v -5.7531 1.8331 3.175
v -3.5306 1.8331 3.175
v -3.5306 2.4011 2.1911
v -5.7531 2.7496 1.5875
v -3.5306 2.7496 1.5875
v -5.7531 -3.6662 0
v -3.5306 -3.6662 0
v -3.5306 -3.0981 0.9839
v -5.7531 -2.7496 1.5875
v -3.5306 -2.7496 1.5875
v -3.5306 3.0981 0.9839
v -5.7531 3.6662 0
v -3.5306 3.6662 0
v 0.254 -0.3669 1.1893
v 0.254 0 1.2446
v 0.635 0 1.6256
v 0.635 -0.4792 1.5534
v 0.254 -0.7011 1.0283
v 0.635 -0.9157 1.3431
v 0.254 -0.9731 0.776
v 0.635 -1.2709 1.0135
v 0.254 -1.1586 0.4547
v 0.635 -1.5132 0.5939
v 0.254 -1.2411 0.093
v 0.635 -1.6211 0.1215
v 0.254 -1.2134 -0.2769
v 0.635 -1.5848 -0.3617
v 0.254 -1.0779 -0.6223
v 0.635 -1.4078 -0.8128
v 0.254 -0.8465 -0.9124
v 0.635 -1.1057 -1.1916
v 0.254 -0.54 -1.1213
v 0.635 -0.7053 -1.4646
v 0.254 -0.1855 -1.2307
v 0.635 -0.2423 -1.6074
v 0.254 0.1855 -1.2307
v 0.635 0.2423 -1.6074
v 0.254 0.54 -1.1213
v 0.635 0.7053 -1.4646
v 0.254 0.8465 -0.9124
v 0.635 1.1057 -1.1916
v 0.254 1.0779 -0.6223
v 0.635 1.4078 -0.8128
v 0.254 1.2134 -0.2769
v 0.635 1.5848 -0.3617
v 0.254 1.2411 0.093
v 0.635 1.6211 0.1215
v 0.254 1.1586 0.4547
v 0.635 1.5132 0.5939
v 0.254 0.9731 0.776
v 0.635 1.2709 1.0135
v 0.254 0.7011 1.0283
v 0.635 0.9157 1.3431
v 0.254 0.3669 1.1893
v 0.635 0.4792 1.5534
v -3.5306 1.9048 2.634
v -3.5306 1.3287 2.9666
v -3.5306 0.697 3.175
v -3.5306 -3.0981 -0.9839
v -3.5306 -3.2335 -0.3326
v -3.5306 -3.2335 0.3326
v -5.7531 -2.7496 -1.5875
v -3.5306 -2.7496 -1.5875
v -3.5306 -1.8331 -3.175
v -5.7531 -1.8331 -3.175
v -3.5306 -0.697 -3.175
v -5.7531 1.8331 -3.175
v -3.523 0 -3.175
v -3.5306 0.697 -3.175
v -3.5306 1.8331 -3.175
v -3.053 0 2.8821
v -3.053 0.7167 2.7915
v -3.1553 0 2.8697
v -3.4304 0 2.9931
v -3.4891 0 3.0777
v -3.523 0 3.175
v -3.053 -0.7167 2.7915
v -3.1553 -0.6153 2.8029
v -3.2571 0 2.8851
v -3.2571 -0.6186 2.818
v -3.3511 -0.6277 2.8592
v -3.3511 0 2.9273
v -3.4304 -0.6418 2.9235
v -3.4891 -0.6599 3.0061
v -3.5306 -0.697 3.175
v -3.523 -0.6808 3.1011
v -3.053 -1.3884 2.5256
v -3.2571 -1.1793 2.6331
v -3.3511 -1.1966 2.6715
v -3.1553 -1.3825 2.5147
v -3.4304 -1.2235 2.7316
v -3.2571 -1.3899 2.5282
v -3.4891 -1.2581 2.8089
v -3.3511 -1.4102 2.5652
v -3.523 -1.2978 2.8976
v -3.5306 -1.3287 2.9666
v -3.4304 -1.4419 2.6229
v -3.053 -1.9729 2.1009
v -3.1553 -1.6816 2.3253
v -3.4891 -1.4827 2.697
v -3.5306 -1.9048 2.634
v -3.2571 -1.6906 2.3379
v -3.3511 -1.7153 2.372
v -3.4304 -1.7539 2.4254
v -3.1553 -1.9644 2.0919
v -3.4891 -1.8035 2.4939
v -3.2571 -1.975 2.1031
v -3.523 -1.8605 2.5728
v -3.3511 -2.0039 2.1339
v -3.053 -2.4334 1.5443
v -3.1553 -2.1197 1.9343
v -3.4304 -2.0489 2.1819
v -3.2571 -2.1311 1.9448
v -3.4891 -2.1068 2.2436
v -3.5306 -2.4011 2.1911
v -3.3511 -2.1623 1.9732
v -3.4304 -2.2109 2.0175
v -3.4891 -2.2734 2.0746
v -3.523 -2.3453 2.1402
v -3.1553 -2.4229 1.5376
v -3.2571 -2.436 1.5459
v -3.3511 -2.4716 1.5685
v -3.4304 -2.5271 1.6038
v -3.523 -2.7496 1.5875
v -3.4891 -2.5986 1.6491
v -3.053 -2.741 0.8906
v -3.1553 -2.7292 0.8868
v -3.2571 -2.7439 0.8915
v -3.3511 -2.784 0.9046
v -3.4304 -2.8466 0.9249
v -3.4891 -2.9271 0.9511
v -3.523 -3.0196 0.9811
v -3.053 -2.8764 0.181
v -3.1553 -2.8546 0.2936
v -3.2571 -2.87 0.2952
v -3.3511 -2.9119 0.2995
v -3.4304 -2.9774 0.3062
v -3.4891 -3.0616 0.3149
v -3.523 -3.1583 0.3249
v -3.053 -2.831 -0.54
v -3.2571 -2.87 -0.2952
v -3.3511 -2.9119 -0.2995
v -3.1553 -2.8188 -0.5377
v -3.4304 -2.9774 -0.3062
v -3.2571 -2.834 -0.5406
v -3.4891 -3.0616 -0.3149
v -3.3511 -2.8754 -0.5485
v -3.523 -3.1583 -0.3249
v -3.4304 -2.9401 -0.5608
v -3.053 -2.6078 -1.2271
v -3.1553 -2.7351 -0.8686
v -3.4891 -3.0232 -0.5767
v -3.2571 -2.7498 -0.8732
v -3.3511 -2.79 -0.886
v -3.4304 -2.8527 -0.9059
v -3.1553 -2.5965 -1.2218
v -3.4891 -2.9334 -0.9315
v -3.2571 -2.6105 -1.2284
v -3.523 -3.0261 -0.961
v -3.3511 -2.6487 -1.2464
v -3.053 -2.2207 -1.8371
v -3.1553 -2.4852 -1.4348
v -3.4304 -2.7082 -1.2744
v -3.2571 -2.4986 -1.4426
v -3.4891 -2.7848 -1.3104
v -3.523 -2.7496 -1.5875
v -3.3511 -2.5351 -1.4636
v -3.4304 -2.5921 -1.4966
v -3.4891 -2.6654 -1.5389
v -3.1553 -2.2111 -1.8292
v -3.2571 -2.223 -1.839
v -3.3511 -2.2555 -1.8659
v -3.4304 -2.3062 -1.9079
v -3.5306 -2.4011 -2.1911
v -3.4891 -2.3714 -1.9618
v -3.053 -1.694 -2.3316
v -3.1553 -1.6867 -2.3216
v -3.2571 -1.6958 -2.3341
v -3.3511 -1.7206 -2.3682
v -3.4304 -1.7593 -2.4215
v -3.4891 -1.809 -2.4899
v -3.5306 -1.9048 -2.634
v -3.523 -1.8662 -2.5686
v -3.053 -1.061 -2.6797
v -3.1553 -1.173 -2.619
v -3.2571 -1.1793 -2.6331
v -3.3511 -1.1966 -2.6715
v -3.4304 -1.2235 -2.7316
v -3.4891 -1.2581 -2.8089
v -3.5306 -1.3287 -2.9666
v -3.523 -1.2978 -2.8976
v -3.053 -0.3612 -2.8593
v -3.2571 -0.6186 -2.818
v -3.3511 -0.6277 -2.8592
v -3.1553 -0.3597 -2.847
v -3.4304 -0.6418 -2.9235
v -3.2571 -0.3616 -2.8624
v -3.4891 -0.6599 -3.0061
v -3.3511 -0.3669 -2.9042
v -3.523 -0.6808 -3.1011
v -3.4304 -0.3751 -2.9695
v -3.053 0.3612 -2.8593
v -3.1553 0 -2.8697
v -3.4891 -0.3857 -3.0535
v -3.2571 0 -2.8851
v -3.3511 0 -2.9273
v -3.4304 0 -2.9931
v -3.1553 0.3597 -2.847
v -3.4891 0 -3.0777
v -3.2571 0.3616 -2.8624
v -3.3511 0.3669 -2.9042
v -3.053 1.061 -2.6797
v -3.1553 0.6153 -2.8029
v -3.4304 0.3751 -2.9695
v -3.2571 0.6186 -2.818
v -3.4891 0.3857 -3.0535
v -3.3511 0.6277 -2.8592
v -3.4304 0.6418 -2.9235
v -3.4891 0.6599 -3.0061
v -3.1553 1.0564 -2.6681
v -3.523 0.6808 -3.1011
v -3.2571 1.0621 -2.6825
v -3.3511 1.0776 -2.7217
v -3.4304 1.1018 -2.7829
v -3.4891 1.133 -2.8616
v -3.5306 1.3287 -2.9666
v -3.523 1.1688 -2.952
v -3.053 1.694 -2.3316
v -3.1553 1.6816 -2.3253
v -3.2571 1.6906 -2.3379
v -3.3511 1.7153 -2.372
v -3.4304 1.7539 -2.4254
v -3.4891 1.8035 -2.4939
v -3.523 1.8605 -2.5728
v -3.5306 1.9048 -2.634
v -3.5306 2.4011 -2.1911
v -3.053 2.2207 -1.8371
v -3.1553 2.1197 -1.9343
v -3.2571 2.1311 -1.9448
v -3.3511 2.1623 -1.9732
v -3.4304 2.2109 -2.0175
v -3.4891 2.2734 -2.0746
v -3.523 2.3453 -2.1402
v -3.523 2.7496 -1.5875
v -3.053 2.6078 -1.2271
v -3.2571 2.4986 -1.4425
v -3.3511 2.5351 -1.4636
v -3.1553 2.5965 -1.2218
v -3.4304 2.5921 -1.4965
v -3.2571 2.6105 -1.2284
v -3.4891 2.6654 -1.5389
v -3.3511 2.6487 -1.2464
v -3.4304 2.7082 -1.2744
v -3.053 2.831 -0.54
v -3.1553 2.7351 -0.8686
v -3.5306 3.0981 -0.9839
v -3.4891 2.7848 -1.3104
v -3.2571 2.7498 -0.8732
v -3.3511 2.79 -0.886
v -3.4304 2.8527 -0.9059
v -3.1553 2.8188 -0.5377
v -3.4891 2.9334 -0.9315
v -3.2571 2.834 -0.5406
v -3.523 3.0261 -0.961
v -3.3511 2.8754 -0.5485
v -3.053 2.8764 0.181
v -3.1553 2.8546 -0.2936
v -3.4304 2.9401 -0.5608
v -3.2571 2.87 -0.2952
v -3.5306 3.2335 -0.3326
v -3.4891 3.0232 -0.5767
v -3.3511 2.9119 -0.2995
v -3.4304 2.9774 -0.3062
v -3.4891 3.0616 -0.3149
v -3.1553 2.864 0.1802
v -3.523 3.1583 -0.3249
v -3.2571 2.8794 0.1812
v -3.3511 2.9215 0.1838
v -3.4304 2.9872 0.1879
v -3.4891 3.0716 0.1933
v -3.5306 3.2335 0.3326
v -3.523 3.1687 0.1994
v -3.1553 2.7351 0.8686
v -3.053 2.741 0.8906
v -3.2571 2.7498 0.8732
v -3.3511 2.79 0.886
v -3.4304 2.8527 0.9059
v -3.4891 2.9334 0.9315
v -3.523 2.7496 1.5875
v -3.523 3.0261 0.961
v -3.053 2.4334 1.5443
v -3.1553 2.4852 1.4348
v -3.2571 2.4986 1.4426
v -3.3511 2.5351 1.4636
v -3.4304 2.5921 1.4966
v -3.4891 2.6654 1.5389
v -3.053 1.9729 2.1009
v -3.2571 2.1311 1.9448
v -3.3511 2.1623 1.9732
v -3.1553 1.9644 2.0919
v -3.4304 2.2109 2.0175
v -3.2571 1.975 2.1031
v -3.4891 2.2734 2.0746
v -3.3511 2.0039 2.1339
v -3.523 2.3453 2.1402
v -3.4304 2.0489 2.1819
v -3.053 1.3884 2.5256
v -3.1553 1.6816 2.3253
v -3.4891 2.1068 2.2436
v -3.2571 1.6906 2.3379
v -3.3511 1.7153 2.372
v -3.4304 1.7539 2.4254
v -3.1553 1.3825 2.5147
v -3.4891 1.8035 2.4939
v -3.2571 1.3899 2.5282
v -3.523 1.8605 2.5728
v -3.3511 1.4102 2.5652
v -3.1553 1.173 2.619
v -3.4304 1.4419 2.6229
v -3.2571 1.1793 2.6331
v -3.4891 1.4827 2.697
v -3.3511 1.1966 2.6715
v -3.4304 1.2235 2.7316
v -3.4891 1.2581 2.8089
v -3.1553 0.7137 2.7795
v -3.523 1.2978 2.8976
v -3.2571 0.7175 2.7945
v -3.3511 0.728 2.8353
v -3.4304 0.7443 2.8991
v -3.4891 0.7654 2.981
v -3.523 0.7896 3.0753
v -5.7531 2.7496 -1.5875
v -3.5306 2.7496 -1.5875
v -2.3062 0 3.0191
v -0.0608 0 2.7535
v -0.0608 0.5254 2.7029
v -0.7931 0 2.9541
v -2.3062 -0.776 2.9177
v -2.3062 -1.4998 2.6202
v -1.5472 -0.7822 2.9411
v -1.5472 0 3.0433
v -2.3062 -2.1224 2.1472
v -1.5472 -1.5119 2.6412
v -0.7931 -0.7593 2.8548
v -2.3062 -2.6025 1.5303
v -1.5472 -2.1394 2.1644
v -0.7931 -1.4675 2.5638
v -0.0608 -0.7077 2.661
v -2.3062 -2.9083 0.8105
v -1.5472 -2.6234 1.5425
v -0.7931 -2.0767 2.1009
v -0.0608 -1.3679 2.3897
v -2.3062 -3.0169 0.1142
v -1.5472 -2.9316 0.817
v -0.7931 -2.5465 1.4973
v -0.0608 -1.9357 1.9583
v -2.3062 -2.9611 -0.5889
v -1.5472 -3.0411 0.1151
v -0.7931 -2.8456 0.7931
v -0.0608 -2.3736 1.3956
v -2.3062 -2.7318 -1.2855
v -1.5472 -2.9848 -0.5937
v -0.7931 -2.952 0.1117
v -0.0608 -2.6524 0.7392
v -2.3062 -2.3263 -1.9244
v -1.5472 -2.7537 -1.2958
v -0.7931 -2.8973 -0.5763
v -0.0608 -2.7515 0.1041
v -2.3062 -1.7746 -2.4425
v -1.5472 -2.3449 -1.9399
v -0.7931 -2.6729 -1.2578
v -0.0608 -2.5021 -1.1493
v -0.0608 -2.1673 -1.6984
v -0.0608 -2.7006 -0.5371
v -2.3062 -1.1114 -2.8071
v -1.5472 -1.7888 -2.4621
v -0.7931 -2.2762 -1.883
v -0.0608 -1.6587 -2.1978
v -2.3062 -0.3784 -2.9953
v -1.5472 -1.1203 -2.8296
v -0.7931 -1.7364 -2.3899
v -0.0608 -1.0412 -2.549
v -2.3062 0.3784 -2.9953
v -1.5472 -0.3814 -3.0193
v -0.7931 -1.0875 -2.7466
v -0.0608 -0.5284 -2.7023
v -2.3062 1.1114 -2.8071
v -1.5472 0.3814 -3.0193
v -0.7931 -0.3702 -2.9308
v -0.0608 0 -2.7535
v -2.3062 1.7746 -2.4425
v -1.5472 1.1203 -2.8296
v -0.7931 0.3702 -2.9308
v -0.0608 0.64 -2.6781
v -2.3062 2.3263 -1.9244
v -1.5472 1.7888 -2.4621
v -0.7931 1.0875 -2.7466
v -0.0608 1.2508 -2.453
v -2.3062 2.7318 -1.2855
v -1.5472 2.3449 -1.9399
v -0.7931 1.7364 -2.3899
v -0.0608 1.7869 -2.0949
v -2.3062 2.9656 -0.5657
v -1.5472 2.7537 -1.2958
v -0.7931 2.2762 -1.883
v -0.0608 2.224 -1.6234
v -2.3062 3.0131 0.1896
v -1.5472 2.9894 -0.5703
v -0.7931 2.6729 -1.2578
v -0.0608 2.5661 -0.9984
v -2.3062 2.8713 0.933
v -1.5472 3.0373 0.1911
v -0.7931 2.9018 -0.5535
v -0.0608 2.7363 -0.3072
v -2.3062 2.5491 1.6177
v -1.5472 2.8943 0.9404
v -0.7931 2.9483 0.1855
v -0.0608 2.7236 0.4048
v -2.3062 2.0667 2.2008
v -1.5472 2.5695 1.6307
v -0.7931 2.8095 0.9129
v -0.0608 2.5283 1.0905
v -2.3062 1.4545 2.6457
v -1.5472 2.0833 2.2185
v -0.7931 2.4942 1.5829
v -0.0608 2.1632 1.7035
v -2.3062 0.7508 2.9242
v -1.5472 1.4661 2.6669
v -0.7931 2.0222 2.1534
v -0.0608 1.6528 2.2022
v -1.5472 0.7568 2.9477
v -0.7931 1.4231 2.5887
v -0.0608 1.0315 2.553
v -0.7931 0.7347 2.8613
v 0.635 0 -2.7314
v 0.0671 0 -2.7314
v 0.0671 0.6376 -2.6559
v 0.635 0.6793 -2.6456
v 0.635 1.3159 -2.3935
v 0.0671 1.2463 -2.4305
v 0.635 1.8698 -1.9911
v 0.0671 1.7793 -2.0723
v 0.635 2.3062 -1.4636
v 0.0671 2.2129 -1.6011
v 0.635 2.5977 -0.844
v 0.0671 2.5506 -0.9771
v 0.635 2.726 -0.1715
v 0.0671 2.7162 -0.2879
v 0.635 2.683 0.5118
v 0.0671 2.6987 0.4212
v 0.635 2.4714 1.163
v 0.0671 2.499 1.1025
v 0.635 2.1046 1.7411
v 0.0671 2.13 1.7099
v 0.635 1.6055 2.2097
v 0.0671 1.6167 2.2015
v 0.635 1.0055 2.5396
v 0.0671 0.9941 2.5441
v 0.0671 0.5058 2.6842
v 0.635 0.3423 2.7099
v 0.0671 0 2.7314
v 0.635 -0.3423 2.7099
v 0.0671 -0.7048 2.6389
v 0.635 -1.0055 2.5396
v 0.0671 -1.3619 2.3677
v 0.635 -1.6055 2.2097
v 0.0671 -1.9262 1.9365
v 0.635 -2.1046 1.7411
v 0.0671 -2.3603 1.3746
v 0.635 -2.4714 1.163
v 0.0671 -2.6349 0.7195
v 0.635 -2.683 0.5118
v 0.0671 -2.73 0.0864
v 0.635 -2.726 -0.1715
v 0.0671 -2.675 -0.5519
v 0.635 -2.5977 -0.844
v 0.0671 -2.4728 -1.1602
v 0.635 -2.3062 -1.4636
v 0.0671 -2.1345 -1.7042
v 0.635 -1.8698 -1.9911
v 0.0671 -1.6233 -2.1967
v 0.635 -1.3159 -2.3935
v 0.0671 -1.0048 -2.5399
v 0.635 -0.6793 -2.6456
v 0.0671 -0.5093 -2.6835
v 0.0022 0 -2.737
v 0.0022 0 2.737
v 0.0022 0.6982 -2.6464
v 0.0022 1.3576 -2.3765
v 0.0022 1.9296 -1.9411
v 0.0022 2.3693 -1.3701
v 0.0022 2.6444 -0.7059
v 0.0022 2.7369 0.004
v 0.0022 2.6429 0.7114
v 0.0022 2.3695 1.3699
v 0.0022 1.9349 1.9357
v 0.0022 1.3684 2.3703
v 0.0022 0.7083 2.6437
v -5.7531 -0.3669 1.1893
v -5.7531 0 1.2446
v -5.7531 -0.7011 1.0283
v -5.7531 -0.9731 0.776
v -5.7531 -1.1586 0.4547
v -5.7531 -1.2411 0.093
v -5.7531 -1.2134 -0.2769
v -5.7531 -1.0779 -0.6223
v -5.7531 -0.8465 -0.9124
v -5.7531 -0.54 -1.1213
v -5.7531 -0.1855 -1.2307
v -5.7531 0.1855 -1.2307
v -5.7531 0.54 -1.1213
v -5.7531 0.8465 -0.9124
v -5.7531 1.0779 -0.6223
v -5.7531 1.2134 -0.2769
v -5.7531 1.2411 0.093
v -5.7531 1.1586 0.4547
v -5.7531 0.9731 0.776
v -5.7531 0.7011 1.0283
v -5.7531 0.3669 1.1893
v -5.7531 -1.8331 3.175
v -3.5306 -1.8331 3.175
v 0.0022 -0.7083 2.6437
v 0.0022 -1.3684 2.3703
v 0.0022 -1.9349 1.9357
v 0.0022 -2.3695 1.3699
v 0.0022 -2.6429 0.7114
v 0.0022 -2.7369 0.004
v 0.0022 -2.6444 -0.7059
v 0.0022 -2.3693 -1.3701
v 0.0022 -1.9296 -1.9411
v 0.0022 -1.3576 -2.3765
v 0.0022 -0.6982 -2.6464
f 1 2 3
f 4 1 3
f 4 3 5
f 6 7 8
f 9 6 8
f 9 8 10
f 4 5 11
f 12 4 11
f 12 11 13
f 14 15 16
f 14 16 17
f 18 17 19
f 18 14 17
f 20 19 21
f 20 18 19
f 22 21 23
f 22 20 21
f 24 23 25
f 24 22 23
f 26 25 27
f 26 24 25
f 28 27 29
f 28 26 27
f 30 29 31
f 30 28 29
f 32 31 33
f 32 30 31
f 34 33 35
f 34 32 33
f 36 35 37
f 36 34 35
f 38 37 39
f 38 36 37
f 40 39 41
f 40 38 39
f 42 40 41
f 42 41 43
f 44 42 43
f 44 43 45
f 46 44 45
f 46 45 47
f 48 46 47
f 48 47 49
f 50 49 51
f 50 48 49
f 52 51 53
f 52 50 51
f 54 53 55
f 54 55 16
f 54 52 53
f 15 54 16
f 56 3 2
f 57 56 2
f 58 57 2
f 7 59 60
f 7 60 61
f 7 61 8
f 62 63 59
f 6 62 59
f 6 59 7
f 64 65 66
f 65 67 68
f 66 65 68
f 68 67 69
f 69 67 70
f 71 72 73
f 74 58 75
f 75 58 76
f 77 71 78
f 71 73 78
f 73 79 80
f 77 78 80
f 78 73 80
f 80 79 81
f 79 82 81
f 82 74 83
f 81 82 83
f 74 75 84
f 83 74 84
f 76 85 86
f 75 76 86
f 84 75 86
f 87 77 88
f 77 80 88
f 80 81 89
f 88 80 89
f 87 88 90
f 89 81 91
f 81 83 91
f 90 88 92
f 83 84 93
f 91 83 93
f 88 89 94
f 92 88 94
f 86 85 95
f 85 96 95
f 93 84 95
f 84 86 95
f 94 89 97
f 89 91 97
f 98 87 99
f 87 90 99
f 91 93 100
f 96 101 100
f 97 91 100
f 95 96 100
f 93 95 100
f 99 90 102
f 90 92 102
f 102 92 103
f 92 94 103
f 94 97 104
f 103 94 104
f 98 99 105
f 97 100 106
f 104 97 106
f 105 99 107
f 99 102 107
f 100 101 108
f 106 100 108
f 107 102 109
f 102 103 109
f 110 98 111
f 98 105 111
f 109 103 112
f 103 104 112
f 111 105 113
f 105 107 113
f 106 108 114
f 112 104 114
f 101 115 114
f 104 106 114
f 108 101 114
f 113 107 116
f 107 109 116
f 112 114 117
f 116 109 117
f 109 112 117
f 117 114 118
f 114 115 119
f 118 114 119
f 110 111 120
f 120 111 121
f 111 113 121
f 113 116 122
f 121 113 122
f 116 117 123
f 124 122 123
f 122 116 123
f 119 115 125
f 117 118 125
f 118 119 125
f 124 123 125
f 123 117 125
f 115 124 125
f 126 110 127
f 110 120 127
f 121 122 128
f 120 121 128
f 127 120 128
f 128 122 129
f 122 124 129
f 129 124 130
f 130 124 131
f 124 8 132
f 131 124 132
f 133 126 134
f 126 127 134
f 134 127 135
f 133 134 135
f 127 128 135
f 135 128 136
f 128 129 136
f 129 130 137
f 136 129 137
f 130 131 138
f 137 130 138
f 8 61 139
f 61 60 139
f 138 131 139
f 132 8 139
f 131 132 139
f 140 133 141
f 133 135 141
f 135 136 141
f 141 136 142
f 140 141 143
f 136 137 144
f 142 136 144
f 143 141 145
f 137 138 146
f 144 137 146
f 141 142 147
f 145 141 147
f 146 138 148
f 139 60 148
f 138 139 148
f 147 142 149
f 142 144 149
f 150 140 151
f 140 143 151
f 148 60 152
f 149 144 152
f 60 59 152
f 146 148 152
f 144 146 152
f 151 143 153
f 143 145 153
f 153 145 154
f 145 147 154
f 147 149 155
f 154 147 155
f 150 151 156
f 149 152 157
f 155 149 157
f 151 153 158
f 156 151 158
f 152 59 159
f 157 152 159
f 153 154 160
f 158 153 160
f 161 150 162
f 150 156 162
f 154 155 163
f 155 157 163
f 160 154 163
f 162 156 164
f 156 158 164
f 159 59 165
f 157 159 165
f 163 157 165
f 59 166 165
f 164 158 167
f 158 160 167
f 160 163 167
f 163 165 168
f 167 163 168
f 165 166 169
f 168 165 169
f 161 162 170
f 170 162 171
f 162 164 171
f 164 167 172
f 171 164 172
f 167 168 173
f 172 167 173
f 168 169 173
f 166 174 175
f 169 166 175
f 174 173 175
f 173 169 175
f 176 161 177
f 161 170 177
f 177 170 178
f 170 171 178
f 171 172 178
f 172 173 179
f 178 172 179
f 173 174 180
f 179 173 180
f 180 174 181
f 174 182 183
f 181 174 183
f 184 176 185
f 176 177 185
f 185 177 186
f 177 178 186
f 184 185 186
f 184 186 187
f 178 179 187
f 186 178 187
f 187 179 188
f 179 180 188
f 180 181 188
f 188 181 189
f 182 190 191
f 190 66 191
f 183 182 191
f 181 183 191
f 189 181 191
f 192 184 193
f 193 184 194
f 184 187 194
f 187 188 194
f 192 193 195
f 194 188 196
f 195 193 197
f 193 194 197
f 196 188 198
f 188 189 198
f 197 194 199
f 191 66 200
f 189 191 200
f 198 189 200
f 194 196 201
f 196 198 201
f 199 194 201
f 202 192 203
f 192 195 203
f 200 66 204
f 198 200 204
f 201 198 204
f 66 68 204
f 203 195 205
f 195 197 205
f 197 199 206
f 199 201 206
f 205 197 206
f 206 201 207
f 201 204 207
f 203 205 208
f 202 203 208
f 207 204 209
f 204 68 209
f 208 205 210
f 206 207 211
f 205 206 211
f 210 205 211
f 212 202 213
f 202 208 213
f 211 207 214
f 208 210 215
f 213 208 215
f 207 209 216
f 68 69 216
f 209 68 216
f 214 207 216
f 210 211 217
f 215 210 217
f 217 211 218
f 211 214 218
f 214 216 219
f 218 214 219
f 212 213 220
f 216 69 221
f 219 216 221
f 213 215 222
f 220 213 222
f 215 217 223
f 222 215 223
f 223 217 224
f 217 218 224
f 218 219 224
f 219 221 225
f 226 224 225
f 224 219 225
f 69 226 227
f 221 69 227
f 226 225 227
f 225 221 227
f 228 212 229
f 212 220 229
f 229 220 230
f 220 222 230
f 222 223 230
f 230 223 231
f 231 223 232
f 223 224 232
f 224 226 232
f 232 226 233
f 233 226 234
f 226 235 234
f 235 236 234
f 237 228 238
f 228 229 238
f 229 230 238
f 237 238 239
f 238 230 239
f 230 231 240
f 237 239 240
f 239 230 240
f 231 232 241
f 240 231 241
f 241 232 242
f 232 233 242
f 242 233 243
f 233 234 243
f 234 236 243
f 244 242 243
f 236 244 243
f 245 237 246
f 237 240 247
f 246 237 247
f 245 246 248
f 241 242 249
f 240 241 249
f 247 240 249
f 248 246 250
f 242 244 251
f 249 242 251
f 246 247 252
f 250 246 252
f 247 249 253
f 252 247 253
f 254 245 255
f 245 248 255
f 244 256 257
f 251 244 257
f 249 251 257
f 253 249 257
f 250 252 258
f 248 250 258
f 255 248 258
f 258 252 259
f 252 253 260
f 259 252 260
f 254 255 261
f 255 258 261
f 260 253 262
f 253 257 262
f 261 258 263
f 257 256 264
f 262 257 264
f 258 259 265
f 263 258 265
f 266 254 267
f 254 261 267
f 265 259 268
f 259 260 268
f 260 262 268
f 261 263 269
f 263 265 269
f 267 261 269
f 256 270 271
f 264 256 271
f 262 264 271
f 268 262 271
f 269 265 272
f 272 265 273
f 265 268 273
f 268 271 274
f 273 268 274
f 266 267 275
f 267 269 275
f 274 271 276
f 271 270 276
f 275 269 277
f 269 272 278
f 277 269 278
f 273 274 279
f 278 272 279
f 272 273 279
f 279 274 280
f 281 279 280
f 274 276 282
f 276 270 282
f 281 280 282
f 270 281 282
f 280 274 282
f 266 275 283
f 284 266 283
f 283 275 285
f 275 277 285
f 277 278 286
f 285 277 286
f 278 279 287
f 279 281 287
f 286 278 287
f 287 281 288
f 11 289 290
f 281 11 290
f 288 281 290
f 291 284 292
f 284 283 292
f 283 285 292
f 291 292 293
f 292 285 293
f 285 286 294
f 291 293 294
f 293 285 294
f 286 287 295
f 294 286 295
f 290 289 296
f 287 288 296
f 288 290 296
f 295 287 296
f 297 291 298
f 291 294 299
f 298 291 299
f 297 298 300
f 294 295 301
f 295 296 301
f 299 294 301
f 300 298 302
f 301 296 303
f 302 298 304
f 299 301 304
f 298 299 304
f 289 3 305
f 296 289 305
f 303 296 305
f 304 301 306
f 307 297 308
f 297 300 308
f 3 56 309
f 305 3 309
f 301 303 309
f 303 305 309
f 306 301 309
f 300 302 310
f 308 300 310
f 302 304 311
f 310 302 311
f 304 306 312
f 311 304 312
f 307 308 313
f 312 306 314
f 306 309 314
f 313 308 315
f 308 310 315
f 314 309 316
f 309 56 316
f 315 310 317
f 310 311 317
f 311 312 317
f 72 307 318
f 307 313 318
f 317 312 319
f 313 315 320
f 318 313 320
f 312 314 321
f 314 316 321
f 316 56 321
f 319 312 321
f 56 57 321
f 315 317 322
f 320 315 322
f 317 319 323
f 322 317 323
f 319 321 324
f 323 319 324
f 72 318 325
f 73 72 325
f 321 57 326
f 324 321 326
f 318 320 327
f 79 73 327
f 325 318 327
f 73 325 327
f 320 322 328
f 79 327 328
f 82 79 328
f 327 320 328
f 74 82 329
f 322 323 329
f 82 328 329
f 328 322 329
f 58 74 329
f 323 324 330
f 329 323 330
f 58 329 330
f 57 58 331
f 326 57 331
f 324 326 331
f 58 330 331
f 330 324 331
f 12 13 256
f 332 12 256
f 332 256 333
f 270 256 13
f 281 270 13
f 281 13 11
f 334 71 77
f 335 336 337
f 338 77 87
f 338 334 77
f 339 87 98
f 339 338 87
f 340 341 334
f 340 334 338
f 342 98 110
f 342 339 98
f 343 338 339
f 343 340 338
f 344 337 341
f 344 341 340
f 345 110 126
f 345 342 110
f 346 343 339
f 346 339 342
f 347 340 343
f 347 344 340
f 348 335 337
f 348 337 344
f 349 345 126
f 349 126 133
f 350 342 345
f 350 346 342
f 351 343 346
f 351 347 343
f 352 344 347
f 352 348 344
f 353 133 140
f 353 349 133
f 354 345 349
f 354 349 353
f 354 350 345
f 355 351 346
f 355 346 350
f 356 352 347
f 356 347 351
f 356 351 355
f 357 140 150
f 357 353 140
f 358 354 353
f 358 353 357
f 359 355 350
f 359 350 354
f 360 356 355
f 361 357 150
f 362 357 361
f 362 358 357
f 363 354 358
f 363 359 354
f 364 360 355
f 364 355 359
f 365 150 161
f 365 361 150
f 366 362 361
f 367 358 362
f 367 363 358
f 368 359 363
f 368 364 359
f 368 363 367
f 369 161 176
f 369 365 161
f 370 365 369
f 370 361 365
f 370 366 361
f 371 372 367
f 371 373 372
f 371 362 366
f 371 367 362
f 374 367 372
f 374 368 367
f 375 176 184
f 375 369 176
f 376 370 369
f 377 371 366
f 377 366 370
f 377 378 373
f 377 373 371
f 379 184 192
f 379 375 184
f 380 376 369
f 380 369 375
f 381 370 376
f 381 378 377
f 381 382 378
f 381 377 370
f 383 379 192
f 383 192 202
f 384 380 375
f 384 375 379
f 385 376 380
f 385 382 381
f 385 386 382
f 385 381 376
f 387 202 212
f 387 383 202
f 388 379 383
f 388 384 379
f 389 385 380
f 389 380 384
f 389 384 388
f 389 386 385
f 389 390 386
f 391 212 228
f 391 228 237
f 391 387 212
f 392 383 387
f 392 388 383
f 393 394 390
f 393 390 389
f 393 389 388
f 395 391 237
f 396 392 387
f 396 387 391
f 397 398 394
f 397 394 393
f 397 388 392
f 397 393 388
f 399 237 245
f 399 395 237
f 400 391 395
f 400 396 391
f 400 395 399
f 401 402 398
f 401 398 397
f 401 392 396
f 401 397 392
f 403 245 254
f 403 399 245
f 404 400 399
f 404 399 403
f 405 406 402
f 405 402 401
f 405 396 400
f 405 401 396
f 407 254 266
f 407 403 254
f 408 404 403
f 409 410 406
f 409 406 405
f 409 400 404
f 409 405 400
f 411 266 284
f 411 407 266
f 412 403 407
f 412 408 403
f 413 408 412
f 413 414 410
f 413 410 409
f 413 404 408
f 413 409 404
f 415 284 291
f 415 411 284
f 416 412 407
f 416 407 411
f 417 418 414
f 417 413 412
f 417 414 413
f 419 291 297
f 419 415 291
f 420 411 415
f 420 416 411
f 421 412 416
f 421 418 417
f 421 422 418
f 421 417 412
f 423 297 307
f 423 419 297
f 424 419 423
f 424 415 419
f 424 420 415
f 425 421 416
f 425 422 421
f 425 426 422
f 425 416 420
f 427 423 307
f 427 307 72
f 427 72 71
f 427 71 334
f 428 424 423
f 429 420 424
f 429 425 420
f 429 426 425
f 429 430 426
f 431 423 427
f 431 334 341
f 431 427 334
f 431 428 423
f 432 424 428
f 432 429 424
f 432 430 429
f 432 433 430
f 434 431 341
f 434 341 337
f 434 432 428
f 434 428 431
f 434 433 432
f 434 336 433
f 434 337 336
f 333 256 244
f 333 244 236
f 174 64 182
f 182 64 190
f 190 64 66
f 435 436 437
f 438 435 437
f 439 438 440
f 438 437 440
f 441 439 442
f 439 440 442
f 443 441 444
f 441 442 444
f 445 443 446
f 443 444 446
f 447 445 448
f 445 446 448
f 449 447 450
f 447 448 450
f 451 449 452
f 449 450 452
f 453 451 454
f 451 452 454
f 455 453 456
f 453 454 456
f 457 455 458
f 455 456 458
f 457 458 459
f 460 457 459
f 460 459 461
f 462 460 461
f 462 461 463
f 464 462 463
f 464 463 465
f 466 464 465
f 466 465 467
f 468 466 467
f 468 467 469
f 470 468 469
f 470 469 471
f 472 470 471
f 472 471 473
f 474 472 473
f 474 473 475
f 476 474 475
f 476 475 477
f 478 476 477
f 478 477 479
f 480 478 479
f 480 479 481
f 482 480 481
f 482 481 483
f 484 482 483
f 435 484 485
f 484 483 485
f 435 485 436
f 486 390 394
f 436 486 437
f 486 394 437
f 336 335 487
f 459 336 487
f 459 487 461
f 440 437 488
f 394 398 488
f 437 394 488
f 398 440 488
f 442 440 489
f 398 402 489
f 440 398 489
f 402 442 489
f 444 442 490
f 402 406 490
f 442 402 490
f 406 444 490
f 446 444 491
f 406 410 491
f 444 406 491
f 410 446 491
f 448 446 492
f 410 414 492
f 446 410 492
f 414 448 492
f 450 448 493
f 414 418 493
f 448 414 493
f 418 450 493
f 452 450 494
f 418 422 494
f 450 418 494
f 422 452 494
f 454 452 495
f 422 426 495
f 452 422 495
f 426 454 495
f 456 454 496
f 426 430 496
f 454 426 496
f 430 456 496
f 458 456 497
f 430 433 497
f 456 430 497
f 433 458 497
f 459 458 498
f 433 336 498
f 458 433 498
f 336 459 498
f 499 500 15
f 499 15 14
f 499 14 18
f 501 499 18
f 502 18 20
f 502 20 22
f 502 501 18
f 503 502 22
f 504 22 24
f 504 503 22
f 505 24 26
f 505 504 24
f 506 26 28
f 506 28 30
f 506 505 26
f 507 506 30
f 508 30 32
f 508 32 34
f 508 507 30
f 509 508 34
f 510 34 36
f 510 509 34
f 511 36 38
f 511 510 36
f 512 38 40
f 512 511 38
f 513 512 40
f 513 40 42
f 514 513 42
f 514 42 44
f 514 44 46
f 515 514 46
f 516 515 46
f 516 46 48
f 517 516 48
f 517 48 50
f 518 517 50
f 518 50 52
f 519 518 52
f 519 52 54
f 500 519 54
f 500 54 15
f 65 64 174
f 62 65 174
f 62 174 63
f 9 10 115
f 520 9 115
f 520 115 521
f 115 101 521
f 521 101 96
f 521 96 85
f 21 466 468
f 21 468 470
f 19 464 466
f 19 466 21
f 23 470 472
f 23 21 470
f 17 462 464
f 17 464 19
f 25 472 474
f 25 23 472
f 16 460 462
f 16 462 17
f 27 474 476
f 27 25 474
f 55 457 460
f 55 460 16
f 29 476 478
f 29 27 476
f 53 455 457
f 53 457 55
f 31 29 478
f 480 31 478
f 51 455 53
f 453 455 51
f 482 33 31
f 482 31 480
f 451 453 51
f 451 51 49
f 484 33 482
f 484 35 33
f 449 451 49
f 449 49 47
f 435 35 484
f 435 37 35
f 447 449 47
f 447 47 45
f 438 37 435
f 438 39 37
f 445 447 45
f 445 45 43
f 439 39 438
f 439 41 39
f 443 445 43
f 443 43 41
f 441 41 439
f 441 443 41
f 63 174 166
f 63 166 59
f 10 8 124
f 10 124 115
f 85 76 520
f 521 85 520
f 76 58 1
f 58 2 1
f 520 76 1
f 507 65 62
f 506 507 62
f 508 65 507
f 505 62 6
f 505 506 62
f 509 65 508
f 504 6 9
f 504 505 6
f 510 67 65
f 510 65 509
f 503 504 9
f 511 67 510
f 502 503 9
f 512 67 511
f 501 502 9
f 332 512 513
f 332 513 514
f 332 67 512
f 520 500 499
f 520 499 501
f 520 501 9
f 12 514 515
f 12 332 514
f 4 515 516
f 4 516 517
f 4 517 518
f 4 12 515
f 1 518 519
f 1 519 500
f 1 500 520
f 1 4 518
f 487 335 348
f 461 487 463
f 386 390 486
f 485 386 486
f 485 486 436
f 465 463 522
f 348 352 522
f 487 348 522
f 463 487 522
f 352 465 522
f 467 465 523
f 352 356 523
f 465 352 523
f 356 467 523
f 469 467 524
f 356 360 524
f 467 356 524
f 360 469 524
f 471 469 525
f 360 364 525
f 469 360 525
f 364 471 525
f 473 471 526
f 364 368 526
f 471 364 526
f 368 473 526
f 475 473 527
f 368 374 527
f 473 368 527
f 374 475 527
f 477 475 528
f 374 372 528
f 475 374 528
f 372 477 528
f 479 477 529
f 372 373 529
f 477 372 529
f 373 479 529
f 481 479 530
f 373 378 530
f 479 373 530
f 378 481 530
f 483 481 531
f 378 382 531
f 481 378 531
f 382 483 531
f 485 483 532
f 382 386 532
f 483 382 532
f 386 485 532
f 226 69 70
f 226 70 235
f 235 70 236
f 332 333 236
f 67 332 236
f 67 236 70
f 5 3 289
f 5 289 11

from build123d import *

# Parameters (mm, degrees)
BOSS_EXTRUDE1_START = -2.2225
SKETCH2_R           = 3.175
SKETCH2_R_2         = 1.2446
BOSS_EXTRUDE1_DEPTH = 2.2225
SKETCH3_R           = 2.731389
SKETCH3_R_2         = 1.2446
BOSS_EXTRUDE2_DEPTH = 0.635
FILLET1_R           = 0.381
FILLET2_R           = 0.381
CHAMFER1_SIZE       = 0.381


with BuildPart() as part:
    # Sketch1 → Revolve1 (revolve)
    with BuildSketch(Plane.XY, mode=Mode.PRIVATE) as revolve1_sk:
        with BuildLine():
            Line((0, 2.731389), (0, 1.2446))
            Line((0, 1.2446), (-5.7531, 1.2446))
            Line((-5.7531, 1.2446), (-5.7531, 3.175))
            Line((-5.7531, 3.175), (-3.5306, 3.175))
            Line((-3.5306, 3.175), (-3.5306, 2.731389))
            ThreePointArc((-3.5306, 2.731389), (-1.7653, 3.047974688), (0, 2.731389))
        make_face()
    revolve(revolve1_sk.sketch.rotate(Axis((-40.930080617, 0, 0), (1, 0, 0)), 90), axis=Axis((-40.930080617, 0, 0), (1, 0, 0)))

    # Sketch2 → Boss-Extrude1 (add)
    # profile 1 of 7: a face of its own
    with BuildSketch(Plane.ZY.offset(5.7531).offset(BOSS_EXTRUDE1_START)):
        with BuildLine():
            Line((1.587499954, 2.749630684), (0, 3.666174209))
            Line((0, 3.666174209), (-1.587500022, 2.749630644))
            ThreePointArc((-1.587500022, 2.749630644), (-3.9e-08, 3.175), (1.587499954, 2.749630684))
        make_face()
    # profile 2 of 7: a face of its own
    with BuildSketch(Plane.ZY.offset(5.7531).offset(BOSS_EXTRUDE1_START)):
        with BuildLine():
            ThreePointArc((-3.175, 0), (-2.749630663, 1.587499989), (-1.587500022, 2.749630644))
            Line((-1.587500022, 2.749630644), (-3.175, 1.833087105))
            Line((-3.175, 1.833087105), (-3.175, 0))
        make_face()
    # profile 3 of 7: a face of its own
    with BuildSketch(Plane.ZY.offset(5.7531).offset(BOSS_EXTRUDE1_START)):
        with BuildLine():
            ThreePointArc((-1.587499933, -2.749630696), (-2.749630638, -1.587500034), (-3.175, 0))
            Line((-3.175, 0), (-3.175, -1.833087105))
            Line((-3.175, -1.833087105), (-1.587499933, -2.749630696))
        make_face()
    # profile 4 of 7: a face of its own
    with BuildSketch(Plane.ZY.offset(5.7531).offset(BOSS_EXTRUDE1_START)):
        with BuildLine():
            ThreePointArc((1.587499954, -2.749630684), (1.2e-08, -3.175), (-1.587499933, -2.749630696))
            Line((-1.587499933, -2.749630696), (0, -3.666174209))
            Line((0, -3.666174209), (1.587499954, -2.749630684))
        make_face()
    # profile 5 of 7: a face of its own
    with BuildSketch(Plane.ZY.offset(5.7531).offset(BOSS_EXTRUDE1_START)):
        with BuildLine():
            Line((3.175, -1.833087105), (3.175, 0))
            ThreePointArc((3.175, 0), (2.749630644, -1.587500023), (1.587499954, -2.749630684))
            Line((1.587499954, -2.749630684), (3.175, -1.833087105))
        make_face()
    # profile 6 of 7: a face of its own
    with BuildSketch(Plane.ZY.offset(5.7531).offset(BOSS_EXTRUDE1_START)):
        with BuildLine():
            Line((3.175, 1.833087105), (1.587499954, 2.749630684))
            ThreePointArc((1.587499954, 2.749630684), (2.749630644, 1.587500023), (3.175, 0))
            Line((3.175, 0), (3.175, 1.833087105))
        make_face()
    # profile 7 of 7: a face of its own
    with BuildSketch(Plane.ZY.offset(5.7531).offset(BOSS_EXTRUDE1_START)):
        Circle(SKETCH2_R)
        Circle(SKETCH2_R_2, mode=Mode.SUBTRACT)
    extrude(amount=BOSS_EXTRUDE1_DEPTH)

    # Sketch3 → Boss-Extrude2 (add)
    with BuildSketch(Plane(origin=(0, 0, 0), x_dir=(0, 0, -1), z_dir=(1, 0, 0))):
        Circle(SKETCH3_R)
        with Locations(Location((0, 0, 0), (0, 0, 180))):
            Circle(SKETCH3_R_2, mode=Mode.SUBTRACT)
    extrude(amount=BOSS_EXTRUDE2_DEPTH)

    # Fillet1
    # the kernel refuses this fillet: 0.381 mm, written as the material it adds along each edge
    with BuildSketch(Plane(origin=(-3.5306, 0, 0), x_dir=(0, 0, 1), z_dir=(0, 1, 0))) as fillet1_piece_1_section:
        with BuildLine():
            CenterArc((3.250609874, 0.381), FILLET1_R, 165.315967452, 104.684032548)
            Line((3.250609874, 0), (2.731389, 0))
            ThreePointArc((2.731389, 0), (2.81260995, 0.236931857), (2.882053931, 0.47757907))
        make_face()
    fillet1_piece_1 = revolve(axis=Axis((-3.5306, 0, 0), (1, 0, 0)), mode=Mode.PRIVATE)
    fillet1_piece_1 = split(fillet1_piece_1, bisect_by=Plane(origin=(-3.388898911, -4.022914712, -0.617892675), z_dir=(0, 0.8660254037844387, -0.49999999999999994)), keep=Keep.TOP, mode=Mode.PRIVATE)
    fillet1_piece_1 = split(fillet1_piece_1, bisect_by=Plane(origin=(-3.388898911, -1.476346602, -3.792892675), z_dir=(0, 0.8660254037844389, 0.4999999999999997)), keep=Keep.TOP, mode=Mode.PRIVATE)
    fillet1_piece_1 = split(fillet1_piece_1, bisect_by=Plane(origin=(-3.388898911, 0, -3.175), z_dir=(0, 0, 1)), keep=Keep.TOP, mode=Mode.PRIVATE)
    fillet1_piece_1 = split(fillet1_piece_1, bisect_by=Plane(origin=(-3.388898911, 1.476346602, -3.792892675), z_dir=(0, -0.8660254037844386, 0.5000000000000001)), keep=Keep.TOP, mode=Mode.PRIVATE)
    fillet1_piece_1 = split(fillet1_piece_1, bisect_by=Plane(origin=(-3.388898911, 4.022914712, -0.617892675), z_dir=(0, -0.8660254037844387, -0.49999999999999983)), keep=Keep.TOP, mode=Mode.PRIVATE)
    fillet1_piece_1 = split(fillet1_piece_1, bisect_by=Plane(origin=(-3.388898911, 0, 3.175), z_dir=(0, 0, -1)), keep=Keep.TOP, mode=Mode.PRIVATE)
    add(fillet1_piece_1)

    # Fillet2
    fillet2_edges = [part.edges().sort_by_distance(p)[0] for p in [
        (0, -2.731389, 0),
    ]]
    fillet(fillet2_edges, radius=FILLET2_R)

    # Chamfer1
    chamfer1_edges = [part.edges().sort_by_distance(p)[0] for p in [
        (0.635, 0, -1.2446),
    ]]
    chamfer(chamfer1_edges, length=CHAMFER1_SIZE)


solid = part.part
